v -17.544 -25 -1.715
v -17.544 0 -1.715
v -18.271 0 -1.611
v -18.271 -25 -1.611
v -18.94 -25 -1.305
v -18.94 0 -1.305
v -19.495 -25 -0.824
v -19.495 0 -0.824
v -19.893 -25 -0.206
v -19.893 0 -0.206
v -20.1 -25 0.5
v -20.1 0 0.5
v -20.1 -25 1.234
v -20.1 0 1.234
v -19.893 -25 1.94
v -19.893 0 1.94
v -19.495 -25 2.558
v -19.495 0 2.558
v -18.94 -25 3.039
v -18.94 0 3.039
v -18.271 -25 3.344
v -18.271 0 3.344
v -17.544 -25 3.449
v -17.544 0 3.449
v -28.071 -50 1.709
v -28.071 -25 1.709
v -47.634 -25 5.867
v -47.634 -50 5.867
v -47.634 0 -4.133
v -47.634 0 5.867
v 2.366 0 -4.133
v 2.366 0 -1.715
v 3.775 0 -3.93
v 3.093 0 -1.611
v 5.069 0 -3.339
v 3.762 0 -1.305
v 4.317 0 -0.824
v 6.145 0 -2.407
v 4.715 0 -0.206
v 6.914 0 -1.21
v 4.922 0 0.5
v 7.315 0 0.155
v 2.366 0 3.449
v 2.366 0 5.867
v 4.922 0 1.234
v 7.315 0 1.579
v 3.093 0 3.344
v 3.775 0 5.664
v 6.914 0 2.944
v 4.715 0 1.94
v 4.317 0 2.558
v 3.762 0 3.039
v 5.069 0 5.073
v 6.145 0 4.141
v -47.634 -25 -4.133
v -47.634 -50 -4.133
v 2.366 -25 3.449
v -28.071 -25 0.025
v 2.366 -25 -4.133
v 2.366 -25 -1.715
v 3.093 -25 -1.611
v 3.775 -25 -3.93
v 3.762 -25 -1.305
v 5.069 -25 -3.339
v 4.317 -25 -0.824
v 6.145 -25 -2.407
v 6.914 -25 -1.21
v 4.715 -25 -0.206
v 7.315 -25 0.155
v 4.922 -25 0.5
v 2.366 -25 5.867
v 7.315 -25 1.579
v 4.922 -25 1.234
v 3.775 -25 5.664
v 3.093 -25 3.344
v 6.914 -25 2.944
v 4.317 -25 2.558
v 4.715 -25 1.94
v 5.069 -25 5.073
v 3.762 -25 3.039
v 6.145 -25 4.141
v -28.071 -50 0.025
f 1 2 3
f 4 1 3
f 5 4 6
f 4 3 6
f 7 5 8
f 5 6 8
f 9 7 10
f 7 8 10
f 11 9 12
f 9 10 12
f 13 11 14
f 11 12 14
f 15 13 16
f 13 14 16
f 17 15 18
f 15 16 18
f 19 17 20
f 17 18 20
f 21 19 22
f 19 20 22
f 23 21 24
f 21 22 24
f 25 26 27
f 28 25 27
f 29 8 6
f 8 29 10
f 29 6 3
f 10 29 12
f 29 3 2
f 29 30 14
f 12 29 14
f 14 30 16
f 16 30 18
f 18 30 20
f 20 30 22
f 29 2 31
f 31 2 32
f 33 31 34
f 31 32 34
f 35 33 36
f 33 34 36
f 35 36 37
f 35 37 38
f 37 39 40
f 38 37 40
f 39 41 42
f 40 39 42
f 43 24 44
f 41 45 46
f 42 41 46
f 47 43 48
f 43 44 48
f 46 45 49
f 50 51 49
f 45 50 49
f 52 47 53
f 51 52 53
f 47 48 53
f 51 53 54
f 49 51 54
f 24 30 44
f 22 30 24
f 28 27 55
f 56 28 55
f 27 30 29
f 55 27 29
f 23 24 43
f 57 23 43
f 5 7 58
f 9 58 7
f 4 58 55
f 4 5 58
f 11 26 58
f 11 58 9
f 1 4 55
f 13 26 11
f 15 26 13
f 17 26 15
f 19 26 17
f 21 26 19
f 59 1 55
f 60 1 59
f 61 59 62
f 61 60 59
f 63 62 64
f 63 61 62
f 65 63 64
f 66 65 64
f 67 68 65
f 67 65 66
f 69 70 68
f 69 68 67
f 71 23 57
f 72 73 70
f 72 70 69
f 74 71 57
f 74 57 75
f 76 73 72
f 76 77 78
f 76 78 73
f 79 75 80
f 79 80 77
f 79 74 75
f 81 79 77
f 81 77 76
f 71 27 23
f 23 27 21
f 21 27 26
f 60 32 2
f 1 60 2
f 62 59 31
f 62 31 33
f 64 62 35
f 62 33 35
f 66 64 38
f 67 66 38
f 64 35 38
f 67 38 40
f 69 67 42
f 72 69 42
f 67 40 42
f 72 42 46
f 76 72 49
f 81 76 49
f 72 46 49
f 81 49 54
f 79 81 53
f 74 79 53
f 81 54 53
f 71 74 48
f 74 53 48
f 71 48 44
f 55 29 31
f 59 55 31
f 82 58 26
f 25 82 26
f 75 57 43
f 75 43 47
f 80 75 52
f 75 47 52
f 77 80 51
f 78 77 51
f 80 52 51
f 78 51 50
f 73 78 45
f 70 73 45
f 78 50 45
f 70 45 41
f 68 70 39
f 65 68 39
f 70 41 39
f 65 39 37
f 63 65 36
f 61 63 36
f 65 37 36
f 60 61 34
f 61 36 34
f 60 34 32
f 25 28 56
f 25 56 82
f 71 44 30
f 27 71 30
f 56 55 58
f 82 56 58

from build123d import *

# Parameters (mm, degrees)
F1_DEPTH = 25
F3_DEPTH = 25


with BuildPart() as f1:
    # F0 (on Front) → F1 (new body)
    with BuildSketch(Plane.XZ):
        with BuildLine():
            Line((2.366019, 5.866973), (-47.633981, 5.866973))
            Line((-47.633981, 5.866973), (-47.633981, -4.133027))
            Line((-47.633981, -4.133027), (2.366019, -4.133027))
            ThreePointArc((2.366019, -4.133027), (7.366019, 0.866973), (2.366019, 5.866973))
        make_face()
        with BuildLine():
            ThreePointArc((2.366019, 3.449053), (4.948099, 0.866973), (2.366019, -1.715107))
            Line((2.366019, -1.715107), (-17.543796, -1.715107))
            ThreePointArc((-17.543796, -1.715107), (-20.125876, 0.866973), (-17.543796, 3.449053))
            Line((-17.543796, 3.449053), (2.366019, 3.449053))
        make_face(mode=Mode.SUBTRACT)
    extrude(amount=F1_DEPTH)

    # F2 (on face) → F3 (join)
    with BuildSketch(Plane.XZ.offset(25)):
        Polygon((-28.071029, 1.708739), (-47.633981, 5.866973), (-47.633981, -4.133027), (-28.071029, 0.025206), align=None)
    extrude(amount=F3_DEPTH)


solid = f1.part
